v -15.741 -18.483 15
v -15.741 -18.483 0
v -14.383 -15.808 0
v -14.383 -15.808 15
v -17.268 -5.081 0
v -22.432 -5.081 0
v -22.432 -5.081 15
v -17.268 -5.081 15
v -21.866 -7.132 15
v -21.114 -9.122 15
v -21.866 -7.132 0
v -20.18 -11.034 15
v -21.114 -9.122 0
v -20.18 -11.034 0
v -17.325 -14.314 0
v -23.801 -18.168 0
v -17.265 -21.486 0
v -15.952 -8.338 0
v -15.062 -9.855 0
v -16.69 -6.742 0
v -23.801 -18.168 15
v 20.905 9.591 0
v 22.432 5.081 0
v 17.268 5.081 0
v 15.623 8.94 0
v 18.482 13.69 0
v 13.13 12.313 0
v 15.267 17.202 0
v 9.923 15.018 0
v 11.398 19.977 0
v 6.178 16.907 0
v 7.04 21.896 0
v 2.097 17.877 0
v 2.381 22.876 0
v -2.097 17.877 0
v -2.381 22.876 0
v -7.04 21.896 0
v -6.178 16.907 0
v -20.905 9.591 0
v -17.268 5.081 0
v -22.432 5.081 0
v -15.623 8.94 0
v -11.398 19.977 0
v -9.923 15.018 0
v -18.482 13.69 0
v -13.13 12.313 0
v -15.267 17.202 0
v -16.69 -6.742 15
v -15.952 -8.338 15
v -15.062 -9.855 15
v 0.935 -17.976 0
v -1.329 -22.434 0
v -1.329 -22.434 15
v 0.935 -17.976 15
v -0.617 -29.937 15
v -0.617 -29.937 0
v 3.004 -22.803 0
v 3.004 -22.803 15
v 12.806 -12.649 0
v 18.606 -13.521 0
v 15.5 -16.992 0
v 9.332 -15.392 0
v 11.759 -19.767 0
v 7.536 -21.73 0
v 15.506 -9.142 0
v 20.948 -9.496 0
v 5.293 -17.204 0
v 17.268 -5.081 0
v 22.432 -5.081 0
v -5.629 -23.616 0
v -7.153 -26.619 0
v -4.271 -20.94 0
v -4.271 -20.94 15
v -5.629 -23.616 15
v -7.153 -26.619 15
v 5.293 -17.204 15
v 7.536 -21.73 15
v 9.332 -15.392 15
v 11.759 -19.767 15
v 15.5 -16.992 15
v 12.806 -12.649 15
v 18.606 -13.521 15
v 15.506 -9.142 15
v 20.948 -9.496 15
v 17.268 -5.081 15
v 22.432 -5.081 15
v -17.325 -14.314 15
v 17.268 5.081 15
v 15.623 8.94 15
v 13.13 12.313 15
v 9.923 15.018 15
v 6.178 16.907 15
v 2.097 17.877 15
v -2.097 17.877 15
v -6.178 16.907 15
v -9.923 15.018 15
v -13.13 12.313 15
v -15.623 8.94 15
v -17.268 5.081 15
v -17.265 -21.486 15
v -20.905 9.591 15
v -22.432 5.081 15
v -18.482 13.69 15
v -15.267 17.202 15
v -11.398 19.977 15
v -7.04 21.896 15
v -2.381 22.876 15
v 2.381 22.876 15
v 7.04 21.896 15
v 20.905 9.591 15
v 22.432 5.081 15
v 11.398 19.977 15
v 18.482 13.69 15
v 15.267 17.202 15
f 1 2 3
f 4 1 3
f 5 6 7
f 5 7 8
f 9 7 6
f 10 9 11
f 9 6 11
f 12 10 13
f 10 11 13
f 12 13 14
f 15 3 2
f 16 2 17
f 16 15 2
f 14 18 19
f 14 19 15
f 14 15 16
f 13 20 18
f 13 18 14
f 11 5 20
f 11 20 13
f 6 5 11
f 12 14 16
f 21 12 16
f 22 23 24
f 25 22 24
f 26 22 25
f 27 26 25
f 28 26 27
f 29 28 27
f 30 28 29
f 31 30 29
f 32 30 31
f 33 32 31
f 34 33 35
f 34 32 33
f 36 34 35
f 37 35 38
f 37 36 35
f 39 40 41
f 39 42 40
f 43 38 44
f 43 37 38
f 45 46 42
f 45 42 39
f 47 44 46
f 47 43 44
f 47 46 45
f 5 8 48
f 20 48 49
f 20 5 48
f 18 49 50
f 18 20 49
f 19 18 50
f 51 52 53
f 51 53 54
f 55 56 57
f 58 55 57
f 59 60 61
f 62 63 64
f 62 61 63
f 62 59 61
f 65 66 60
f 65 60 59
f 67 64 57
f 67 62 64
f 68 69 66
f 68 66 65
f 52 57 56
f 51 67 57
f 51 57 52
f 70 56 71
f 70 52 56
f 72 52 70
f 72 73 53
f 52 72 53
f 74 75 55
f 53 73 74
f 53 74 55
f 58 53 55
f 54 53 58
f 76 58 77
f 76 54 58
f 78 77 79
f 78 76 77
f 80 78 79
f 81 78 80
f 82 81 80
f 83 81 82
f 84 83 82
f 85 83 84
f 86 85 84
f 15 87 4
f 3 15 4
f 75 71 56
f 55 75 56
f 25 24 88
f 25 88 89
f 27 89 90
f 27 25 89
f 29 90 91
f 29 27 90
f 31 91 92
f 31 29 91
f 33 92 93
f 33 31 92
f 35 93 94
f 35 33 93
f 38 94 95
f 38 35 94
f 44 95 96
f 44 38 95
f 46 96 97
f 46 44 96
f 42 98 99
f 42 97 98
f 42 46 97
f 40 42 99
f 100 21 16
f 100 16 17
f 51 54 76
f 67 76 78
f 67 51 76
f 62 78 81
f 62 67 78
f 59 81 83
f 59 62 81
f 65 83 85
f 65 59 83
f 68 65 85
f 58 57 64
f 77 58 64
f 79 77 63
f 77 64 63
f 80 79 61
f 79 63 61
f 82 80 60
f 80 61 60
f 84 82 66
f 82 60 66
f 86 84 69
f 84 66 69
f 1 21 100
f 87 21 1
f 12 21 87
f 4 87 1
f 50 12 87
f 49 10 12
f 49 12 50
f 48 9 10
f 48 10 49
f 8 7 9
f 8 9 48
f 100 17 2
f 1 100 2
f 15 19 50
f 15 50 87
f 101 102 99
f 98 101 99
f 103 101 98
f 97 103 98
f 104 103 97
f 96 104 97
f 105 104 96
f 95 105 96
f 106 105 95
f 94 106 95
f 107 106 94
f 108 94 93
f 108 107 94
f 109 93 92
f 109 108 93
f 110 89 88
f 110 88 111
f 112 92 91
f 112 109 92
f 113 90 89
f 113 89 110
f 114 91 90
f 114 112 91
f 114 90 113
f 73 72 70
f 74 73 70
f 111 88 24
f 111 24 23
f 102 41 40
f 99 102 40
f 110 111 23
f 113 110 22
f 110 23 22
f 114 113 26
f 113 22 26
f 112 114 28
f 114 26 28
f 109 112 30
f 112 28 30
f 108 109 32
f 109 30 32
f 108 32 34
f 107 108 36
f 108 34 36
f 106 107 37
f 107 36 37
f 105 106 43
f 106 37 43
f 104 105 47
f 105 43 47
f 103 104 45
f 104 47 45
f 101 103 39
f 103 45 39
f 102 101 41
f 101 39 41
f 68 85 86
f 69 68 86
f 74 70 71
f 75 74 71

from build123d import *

# Parameters (mm, degrees)
SKETCH1_R           = 23
SKETCH1_R_2         = 18
BOSS_EXTRUDE1_DEPTH = 15
BOSS_EXTRUDE2_DEPTH = 15
CUT_EXTRUDE1_DEPTH  = 21
BOSS_EXTRUDE3_DEPTH = 21
SKETCH7_R           = 2.2
CUT_EXTRUDE2_DEPTH  = 21
CUT_EXTRUDE3_DEPTH  = 21
SKETCH9_W           = 54.729163564
SKETCH9_H           = 10.162331038
CUT_EXTRUDE4_DEPTH  = 21
CUT_EXTRUDE5_DEPTH  = 21


with BuildPart() as part:
    # Sketch1 → Boss-Extrude1 (new body)
    with BuildSketch(Plane.XY):
        Circle(SKETCH1_R)
        Circle(SKETCH1_R_2, mode=Mode.SUBTRACT)
    extrude(amount=BOSS_EXTRUDE1_DEPTH)

    # Sketch3 → Boss-Extrude2 (add)
    with BuildSketch(Plane.XY):
        with BuildLine():
            Line((-23.80139919, -18.167885182), (-0.617388595, -29.936557696))
            Line((-0.617388595, -29.936557696), (3.003741409, -22.803015975))
            ThreePointArc((3.003741409, -22.803015975), (-10.410748762, -20.508932449), (-20.180269185, -11.034343461))
            Line((-20.180269185, -11.034343461), (-23.80139919, -18.167885182))
        make_face()
    extrude(amount=BOSS_EXTRUDE2_DEPTH)

    # Sketch5 → Cut-Extrude1 (cut)
    with BuildSketch(Plane.XY):
        with BuildLine():
            Line((-15.062285021, -9.855332057), (-17.325491273, -14.313795633))
            Line((-17.325491273, -14.313795633), (-1.328523963, -22.434179668))
            Line((-1.328523963, -22.434179668), (0.93468229, -17.975716092))
            ThreePointArc((0.93468229, -17.975716092), (-8.14754251, -16.050468873), (-15.062285021, -9.855332057))
        make_face()
    extrude(amount=CUT_EXTRUDE1_DEPTH, mode=Mode.SUBTRACT)

    # Sketch6 → Boss-Extrude3 (add)
    with BuildSketch(Plane.XY):
        with BuildLine():
            ThreePointArc((-22.555487137, -4.5), (-26.136916399, 0), (-22.555487137, 4.5))
            ThreePointArc((-22.555487137, 4.5), (-23, 0), (-22.555487137, -4.5))
        make_face()
        with BuildLine():
            ThreePointArc((22.555487137, -4.5), (25.860234666, 0), (22.555487137, 4.5))
            ThreePointArc((22.555487137, 4.5), (23, 0), (22.555487137, -4.5))
        make_face()
    extrude(amount=BOSS_EXTRUDE3_DEPTH)

    # Sketch7 → Cut-Extrude2 (cut)
    with BuildSketch(Plane.XY):
        with Locations(Location((-21.5, 0, 0), (0, 0, 130.877182194))):
            Circle(SKETCH7_R)
        with Locations(Location((21.5, 0, 0), (0, 0, 49.122817806))):
            Circle(SKETCH7_R)
    extrude(amount=CUT_EXTRUDE2_DEPTH, mode=Mode.SUBTRACT)

    # Sketch8 → Cut-Extrude3 (cut)
    with BuildSketch(Plane.XY):
        Polygon((-14.382905313, -15.80751176), (-4.271109923, -20.940463541), (-5.629033675, -23.615541687), (-15.740829065, -18.482589905), align=None)
    extrude(amount=CUT_EXTRUDE3_DEPTH, mode=Mode.SUBTRACT)

    # Sketch9 → Cut-Extrude4 (cut)
    with BuildSketch(Plane.XY):
        Rectangle(SKETCH9_W, SKETCH9_H)
    extrude(amount=CUT_EXTRUDE4_DEPTH, mode=Mode.SUBTRACT)


with BuildPart() as cut_extrude4_piece_1:
    # of the separate pieces the step leaves, piece 1, a body of its own (cut_extrude4_pieces)
    add(part.part.solids().sort_by_distance((3.003741409, -22.803015975, 0))[0])

    # Sketch10 → Cut-Extrude5 (cut)
    with BuildSketch(Plane.XY):
        Polygon((-15.740829065, -18.482589905), (-5.629033675, -23.615541687), (-7.153496197, -26.61869733), (-17.265291587, -21.485745549), align=None)
    extrude(amount=CUT_EXTRUDE5_DEPTH, mode=Mode.SUBTRACT)


with BuildPart() as cut_extrude4_piece_2:
    # of the separate pieces the step leaves, piece 2, a body of its own (cut_extrude4_pieces)
    add(part.part.solids().sort_by_distance((-17.267940148, 5.081165519, 0))[0])


with BuildPart() as cut_extrude5_piece_1:
    # of the separate pieces the step leaves, piece 1, a body of its own (cut_extrude5_pieces)
    add(cut_extrude4_piece_1.part.solids().sort_by_distance((3.003741409, -22.803015975, 0))[0])


with BuildPart() as cut_extrude5_piece_2:
    # of the separate pieces the step leaves, piece 2, a body of its own (cut_extrude5_pieces)
    add(cut_extrude4_piece_1.part.solids().sort_by_distance((-22.431713197, -5.081165519, 0))[0])


solid = Compound([cut_extrude4_piece_2.part, cut_extrude5_piece_1.part, cut_extrude5_piece_2.part])
